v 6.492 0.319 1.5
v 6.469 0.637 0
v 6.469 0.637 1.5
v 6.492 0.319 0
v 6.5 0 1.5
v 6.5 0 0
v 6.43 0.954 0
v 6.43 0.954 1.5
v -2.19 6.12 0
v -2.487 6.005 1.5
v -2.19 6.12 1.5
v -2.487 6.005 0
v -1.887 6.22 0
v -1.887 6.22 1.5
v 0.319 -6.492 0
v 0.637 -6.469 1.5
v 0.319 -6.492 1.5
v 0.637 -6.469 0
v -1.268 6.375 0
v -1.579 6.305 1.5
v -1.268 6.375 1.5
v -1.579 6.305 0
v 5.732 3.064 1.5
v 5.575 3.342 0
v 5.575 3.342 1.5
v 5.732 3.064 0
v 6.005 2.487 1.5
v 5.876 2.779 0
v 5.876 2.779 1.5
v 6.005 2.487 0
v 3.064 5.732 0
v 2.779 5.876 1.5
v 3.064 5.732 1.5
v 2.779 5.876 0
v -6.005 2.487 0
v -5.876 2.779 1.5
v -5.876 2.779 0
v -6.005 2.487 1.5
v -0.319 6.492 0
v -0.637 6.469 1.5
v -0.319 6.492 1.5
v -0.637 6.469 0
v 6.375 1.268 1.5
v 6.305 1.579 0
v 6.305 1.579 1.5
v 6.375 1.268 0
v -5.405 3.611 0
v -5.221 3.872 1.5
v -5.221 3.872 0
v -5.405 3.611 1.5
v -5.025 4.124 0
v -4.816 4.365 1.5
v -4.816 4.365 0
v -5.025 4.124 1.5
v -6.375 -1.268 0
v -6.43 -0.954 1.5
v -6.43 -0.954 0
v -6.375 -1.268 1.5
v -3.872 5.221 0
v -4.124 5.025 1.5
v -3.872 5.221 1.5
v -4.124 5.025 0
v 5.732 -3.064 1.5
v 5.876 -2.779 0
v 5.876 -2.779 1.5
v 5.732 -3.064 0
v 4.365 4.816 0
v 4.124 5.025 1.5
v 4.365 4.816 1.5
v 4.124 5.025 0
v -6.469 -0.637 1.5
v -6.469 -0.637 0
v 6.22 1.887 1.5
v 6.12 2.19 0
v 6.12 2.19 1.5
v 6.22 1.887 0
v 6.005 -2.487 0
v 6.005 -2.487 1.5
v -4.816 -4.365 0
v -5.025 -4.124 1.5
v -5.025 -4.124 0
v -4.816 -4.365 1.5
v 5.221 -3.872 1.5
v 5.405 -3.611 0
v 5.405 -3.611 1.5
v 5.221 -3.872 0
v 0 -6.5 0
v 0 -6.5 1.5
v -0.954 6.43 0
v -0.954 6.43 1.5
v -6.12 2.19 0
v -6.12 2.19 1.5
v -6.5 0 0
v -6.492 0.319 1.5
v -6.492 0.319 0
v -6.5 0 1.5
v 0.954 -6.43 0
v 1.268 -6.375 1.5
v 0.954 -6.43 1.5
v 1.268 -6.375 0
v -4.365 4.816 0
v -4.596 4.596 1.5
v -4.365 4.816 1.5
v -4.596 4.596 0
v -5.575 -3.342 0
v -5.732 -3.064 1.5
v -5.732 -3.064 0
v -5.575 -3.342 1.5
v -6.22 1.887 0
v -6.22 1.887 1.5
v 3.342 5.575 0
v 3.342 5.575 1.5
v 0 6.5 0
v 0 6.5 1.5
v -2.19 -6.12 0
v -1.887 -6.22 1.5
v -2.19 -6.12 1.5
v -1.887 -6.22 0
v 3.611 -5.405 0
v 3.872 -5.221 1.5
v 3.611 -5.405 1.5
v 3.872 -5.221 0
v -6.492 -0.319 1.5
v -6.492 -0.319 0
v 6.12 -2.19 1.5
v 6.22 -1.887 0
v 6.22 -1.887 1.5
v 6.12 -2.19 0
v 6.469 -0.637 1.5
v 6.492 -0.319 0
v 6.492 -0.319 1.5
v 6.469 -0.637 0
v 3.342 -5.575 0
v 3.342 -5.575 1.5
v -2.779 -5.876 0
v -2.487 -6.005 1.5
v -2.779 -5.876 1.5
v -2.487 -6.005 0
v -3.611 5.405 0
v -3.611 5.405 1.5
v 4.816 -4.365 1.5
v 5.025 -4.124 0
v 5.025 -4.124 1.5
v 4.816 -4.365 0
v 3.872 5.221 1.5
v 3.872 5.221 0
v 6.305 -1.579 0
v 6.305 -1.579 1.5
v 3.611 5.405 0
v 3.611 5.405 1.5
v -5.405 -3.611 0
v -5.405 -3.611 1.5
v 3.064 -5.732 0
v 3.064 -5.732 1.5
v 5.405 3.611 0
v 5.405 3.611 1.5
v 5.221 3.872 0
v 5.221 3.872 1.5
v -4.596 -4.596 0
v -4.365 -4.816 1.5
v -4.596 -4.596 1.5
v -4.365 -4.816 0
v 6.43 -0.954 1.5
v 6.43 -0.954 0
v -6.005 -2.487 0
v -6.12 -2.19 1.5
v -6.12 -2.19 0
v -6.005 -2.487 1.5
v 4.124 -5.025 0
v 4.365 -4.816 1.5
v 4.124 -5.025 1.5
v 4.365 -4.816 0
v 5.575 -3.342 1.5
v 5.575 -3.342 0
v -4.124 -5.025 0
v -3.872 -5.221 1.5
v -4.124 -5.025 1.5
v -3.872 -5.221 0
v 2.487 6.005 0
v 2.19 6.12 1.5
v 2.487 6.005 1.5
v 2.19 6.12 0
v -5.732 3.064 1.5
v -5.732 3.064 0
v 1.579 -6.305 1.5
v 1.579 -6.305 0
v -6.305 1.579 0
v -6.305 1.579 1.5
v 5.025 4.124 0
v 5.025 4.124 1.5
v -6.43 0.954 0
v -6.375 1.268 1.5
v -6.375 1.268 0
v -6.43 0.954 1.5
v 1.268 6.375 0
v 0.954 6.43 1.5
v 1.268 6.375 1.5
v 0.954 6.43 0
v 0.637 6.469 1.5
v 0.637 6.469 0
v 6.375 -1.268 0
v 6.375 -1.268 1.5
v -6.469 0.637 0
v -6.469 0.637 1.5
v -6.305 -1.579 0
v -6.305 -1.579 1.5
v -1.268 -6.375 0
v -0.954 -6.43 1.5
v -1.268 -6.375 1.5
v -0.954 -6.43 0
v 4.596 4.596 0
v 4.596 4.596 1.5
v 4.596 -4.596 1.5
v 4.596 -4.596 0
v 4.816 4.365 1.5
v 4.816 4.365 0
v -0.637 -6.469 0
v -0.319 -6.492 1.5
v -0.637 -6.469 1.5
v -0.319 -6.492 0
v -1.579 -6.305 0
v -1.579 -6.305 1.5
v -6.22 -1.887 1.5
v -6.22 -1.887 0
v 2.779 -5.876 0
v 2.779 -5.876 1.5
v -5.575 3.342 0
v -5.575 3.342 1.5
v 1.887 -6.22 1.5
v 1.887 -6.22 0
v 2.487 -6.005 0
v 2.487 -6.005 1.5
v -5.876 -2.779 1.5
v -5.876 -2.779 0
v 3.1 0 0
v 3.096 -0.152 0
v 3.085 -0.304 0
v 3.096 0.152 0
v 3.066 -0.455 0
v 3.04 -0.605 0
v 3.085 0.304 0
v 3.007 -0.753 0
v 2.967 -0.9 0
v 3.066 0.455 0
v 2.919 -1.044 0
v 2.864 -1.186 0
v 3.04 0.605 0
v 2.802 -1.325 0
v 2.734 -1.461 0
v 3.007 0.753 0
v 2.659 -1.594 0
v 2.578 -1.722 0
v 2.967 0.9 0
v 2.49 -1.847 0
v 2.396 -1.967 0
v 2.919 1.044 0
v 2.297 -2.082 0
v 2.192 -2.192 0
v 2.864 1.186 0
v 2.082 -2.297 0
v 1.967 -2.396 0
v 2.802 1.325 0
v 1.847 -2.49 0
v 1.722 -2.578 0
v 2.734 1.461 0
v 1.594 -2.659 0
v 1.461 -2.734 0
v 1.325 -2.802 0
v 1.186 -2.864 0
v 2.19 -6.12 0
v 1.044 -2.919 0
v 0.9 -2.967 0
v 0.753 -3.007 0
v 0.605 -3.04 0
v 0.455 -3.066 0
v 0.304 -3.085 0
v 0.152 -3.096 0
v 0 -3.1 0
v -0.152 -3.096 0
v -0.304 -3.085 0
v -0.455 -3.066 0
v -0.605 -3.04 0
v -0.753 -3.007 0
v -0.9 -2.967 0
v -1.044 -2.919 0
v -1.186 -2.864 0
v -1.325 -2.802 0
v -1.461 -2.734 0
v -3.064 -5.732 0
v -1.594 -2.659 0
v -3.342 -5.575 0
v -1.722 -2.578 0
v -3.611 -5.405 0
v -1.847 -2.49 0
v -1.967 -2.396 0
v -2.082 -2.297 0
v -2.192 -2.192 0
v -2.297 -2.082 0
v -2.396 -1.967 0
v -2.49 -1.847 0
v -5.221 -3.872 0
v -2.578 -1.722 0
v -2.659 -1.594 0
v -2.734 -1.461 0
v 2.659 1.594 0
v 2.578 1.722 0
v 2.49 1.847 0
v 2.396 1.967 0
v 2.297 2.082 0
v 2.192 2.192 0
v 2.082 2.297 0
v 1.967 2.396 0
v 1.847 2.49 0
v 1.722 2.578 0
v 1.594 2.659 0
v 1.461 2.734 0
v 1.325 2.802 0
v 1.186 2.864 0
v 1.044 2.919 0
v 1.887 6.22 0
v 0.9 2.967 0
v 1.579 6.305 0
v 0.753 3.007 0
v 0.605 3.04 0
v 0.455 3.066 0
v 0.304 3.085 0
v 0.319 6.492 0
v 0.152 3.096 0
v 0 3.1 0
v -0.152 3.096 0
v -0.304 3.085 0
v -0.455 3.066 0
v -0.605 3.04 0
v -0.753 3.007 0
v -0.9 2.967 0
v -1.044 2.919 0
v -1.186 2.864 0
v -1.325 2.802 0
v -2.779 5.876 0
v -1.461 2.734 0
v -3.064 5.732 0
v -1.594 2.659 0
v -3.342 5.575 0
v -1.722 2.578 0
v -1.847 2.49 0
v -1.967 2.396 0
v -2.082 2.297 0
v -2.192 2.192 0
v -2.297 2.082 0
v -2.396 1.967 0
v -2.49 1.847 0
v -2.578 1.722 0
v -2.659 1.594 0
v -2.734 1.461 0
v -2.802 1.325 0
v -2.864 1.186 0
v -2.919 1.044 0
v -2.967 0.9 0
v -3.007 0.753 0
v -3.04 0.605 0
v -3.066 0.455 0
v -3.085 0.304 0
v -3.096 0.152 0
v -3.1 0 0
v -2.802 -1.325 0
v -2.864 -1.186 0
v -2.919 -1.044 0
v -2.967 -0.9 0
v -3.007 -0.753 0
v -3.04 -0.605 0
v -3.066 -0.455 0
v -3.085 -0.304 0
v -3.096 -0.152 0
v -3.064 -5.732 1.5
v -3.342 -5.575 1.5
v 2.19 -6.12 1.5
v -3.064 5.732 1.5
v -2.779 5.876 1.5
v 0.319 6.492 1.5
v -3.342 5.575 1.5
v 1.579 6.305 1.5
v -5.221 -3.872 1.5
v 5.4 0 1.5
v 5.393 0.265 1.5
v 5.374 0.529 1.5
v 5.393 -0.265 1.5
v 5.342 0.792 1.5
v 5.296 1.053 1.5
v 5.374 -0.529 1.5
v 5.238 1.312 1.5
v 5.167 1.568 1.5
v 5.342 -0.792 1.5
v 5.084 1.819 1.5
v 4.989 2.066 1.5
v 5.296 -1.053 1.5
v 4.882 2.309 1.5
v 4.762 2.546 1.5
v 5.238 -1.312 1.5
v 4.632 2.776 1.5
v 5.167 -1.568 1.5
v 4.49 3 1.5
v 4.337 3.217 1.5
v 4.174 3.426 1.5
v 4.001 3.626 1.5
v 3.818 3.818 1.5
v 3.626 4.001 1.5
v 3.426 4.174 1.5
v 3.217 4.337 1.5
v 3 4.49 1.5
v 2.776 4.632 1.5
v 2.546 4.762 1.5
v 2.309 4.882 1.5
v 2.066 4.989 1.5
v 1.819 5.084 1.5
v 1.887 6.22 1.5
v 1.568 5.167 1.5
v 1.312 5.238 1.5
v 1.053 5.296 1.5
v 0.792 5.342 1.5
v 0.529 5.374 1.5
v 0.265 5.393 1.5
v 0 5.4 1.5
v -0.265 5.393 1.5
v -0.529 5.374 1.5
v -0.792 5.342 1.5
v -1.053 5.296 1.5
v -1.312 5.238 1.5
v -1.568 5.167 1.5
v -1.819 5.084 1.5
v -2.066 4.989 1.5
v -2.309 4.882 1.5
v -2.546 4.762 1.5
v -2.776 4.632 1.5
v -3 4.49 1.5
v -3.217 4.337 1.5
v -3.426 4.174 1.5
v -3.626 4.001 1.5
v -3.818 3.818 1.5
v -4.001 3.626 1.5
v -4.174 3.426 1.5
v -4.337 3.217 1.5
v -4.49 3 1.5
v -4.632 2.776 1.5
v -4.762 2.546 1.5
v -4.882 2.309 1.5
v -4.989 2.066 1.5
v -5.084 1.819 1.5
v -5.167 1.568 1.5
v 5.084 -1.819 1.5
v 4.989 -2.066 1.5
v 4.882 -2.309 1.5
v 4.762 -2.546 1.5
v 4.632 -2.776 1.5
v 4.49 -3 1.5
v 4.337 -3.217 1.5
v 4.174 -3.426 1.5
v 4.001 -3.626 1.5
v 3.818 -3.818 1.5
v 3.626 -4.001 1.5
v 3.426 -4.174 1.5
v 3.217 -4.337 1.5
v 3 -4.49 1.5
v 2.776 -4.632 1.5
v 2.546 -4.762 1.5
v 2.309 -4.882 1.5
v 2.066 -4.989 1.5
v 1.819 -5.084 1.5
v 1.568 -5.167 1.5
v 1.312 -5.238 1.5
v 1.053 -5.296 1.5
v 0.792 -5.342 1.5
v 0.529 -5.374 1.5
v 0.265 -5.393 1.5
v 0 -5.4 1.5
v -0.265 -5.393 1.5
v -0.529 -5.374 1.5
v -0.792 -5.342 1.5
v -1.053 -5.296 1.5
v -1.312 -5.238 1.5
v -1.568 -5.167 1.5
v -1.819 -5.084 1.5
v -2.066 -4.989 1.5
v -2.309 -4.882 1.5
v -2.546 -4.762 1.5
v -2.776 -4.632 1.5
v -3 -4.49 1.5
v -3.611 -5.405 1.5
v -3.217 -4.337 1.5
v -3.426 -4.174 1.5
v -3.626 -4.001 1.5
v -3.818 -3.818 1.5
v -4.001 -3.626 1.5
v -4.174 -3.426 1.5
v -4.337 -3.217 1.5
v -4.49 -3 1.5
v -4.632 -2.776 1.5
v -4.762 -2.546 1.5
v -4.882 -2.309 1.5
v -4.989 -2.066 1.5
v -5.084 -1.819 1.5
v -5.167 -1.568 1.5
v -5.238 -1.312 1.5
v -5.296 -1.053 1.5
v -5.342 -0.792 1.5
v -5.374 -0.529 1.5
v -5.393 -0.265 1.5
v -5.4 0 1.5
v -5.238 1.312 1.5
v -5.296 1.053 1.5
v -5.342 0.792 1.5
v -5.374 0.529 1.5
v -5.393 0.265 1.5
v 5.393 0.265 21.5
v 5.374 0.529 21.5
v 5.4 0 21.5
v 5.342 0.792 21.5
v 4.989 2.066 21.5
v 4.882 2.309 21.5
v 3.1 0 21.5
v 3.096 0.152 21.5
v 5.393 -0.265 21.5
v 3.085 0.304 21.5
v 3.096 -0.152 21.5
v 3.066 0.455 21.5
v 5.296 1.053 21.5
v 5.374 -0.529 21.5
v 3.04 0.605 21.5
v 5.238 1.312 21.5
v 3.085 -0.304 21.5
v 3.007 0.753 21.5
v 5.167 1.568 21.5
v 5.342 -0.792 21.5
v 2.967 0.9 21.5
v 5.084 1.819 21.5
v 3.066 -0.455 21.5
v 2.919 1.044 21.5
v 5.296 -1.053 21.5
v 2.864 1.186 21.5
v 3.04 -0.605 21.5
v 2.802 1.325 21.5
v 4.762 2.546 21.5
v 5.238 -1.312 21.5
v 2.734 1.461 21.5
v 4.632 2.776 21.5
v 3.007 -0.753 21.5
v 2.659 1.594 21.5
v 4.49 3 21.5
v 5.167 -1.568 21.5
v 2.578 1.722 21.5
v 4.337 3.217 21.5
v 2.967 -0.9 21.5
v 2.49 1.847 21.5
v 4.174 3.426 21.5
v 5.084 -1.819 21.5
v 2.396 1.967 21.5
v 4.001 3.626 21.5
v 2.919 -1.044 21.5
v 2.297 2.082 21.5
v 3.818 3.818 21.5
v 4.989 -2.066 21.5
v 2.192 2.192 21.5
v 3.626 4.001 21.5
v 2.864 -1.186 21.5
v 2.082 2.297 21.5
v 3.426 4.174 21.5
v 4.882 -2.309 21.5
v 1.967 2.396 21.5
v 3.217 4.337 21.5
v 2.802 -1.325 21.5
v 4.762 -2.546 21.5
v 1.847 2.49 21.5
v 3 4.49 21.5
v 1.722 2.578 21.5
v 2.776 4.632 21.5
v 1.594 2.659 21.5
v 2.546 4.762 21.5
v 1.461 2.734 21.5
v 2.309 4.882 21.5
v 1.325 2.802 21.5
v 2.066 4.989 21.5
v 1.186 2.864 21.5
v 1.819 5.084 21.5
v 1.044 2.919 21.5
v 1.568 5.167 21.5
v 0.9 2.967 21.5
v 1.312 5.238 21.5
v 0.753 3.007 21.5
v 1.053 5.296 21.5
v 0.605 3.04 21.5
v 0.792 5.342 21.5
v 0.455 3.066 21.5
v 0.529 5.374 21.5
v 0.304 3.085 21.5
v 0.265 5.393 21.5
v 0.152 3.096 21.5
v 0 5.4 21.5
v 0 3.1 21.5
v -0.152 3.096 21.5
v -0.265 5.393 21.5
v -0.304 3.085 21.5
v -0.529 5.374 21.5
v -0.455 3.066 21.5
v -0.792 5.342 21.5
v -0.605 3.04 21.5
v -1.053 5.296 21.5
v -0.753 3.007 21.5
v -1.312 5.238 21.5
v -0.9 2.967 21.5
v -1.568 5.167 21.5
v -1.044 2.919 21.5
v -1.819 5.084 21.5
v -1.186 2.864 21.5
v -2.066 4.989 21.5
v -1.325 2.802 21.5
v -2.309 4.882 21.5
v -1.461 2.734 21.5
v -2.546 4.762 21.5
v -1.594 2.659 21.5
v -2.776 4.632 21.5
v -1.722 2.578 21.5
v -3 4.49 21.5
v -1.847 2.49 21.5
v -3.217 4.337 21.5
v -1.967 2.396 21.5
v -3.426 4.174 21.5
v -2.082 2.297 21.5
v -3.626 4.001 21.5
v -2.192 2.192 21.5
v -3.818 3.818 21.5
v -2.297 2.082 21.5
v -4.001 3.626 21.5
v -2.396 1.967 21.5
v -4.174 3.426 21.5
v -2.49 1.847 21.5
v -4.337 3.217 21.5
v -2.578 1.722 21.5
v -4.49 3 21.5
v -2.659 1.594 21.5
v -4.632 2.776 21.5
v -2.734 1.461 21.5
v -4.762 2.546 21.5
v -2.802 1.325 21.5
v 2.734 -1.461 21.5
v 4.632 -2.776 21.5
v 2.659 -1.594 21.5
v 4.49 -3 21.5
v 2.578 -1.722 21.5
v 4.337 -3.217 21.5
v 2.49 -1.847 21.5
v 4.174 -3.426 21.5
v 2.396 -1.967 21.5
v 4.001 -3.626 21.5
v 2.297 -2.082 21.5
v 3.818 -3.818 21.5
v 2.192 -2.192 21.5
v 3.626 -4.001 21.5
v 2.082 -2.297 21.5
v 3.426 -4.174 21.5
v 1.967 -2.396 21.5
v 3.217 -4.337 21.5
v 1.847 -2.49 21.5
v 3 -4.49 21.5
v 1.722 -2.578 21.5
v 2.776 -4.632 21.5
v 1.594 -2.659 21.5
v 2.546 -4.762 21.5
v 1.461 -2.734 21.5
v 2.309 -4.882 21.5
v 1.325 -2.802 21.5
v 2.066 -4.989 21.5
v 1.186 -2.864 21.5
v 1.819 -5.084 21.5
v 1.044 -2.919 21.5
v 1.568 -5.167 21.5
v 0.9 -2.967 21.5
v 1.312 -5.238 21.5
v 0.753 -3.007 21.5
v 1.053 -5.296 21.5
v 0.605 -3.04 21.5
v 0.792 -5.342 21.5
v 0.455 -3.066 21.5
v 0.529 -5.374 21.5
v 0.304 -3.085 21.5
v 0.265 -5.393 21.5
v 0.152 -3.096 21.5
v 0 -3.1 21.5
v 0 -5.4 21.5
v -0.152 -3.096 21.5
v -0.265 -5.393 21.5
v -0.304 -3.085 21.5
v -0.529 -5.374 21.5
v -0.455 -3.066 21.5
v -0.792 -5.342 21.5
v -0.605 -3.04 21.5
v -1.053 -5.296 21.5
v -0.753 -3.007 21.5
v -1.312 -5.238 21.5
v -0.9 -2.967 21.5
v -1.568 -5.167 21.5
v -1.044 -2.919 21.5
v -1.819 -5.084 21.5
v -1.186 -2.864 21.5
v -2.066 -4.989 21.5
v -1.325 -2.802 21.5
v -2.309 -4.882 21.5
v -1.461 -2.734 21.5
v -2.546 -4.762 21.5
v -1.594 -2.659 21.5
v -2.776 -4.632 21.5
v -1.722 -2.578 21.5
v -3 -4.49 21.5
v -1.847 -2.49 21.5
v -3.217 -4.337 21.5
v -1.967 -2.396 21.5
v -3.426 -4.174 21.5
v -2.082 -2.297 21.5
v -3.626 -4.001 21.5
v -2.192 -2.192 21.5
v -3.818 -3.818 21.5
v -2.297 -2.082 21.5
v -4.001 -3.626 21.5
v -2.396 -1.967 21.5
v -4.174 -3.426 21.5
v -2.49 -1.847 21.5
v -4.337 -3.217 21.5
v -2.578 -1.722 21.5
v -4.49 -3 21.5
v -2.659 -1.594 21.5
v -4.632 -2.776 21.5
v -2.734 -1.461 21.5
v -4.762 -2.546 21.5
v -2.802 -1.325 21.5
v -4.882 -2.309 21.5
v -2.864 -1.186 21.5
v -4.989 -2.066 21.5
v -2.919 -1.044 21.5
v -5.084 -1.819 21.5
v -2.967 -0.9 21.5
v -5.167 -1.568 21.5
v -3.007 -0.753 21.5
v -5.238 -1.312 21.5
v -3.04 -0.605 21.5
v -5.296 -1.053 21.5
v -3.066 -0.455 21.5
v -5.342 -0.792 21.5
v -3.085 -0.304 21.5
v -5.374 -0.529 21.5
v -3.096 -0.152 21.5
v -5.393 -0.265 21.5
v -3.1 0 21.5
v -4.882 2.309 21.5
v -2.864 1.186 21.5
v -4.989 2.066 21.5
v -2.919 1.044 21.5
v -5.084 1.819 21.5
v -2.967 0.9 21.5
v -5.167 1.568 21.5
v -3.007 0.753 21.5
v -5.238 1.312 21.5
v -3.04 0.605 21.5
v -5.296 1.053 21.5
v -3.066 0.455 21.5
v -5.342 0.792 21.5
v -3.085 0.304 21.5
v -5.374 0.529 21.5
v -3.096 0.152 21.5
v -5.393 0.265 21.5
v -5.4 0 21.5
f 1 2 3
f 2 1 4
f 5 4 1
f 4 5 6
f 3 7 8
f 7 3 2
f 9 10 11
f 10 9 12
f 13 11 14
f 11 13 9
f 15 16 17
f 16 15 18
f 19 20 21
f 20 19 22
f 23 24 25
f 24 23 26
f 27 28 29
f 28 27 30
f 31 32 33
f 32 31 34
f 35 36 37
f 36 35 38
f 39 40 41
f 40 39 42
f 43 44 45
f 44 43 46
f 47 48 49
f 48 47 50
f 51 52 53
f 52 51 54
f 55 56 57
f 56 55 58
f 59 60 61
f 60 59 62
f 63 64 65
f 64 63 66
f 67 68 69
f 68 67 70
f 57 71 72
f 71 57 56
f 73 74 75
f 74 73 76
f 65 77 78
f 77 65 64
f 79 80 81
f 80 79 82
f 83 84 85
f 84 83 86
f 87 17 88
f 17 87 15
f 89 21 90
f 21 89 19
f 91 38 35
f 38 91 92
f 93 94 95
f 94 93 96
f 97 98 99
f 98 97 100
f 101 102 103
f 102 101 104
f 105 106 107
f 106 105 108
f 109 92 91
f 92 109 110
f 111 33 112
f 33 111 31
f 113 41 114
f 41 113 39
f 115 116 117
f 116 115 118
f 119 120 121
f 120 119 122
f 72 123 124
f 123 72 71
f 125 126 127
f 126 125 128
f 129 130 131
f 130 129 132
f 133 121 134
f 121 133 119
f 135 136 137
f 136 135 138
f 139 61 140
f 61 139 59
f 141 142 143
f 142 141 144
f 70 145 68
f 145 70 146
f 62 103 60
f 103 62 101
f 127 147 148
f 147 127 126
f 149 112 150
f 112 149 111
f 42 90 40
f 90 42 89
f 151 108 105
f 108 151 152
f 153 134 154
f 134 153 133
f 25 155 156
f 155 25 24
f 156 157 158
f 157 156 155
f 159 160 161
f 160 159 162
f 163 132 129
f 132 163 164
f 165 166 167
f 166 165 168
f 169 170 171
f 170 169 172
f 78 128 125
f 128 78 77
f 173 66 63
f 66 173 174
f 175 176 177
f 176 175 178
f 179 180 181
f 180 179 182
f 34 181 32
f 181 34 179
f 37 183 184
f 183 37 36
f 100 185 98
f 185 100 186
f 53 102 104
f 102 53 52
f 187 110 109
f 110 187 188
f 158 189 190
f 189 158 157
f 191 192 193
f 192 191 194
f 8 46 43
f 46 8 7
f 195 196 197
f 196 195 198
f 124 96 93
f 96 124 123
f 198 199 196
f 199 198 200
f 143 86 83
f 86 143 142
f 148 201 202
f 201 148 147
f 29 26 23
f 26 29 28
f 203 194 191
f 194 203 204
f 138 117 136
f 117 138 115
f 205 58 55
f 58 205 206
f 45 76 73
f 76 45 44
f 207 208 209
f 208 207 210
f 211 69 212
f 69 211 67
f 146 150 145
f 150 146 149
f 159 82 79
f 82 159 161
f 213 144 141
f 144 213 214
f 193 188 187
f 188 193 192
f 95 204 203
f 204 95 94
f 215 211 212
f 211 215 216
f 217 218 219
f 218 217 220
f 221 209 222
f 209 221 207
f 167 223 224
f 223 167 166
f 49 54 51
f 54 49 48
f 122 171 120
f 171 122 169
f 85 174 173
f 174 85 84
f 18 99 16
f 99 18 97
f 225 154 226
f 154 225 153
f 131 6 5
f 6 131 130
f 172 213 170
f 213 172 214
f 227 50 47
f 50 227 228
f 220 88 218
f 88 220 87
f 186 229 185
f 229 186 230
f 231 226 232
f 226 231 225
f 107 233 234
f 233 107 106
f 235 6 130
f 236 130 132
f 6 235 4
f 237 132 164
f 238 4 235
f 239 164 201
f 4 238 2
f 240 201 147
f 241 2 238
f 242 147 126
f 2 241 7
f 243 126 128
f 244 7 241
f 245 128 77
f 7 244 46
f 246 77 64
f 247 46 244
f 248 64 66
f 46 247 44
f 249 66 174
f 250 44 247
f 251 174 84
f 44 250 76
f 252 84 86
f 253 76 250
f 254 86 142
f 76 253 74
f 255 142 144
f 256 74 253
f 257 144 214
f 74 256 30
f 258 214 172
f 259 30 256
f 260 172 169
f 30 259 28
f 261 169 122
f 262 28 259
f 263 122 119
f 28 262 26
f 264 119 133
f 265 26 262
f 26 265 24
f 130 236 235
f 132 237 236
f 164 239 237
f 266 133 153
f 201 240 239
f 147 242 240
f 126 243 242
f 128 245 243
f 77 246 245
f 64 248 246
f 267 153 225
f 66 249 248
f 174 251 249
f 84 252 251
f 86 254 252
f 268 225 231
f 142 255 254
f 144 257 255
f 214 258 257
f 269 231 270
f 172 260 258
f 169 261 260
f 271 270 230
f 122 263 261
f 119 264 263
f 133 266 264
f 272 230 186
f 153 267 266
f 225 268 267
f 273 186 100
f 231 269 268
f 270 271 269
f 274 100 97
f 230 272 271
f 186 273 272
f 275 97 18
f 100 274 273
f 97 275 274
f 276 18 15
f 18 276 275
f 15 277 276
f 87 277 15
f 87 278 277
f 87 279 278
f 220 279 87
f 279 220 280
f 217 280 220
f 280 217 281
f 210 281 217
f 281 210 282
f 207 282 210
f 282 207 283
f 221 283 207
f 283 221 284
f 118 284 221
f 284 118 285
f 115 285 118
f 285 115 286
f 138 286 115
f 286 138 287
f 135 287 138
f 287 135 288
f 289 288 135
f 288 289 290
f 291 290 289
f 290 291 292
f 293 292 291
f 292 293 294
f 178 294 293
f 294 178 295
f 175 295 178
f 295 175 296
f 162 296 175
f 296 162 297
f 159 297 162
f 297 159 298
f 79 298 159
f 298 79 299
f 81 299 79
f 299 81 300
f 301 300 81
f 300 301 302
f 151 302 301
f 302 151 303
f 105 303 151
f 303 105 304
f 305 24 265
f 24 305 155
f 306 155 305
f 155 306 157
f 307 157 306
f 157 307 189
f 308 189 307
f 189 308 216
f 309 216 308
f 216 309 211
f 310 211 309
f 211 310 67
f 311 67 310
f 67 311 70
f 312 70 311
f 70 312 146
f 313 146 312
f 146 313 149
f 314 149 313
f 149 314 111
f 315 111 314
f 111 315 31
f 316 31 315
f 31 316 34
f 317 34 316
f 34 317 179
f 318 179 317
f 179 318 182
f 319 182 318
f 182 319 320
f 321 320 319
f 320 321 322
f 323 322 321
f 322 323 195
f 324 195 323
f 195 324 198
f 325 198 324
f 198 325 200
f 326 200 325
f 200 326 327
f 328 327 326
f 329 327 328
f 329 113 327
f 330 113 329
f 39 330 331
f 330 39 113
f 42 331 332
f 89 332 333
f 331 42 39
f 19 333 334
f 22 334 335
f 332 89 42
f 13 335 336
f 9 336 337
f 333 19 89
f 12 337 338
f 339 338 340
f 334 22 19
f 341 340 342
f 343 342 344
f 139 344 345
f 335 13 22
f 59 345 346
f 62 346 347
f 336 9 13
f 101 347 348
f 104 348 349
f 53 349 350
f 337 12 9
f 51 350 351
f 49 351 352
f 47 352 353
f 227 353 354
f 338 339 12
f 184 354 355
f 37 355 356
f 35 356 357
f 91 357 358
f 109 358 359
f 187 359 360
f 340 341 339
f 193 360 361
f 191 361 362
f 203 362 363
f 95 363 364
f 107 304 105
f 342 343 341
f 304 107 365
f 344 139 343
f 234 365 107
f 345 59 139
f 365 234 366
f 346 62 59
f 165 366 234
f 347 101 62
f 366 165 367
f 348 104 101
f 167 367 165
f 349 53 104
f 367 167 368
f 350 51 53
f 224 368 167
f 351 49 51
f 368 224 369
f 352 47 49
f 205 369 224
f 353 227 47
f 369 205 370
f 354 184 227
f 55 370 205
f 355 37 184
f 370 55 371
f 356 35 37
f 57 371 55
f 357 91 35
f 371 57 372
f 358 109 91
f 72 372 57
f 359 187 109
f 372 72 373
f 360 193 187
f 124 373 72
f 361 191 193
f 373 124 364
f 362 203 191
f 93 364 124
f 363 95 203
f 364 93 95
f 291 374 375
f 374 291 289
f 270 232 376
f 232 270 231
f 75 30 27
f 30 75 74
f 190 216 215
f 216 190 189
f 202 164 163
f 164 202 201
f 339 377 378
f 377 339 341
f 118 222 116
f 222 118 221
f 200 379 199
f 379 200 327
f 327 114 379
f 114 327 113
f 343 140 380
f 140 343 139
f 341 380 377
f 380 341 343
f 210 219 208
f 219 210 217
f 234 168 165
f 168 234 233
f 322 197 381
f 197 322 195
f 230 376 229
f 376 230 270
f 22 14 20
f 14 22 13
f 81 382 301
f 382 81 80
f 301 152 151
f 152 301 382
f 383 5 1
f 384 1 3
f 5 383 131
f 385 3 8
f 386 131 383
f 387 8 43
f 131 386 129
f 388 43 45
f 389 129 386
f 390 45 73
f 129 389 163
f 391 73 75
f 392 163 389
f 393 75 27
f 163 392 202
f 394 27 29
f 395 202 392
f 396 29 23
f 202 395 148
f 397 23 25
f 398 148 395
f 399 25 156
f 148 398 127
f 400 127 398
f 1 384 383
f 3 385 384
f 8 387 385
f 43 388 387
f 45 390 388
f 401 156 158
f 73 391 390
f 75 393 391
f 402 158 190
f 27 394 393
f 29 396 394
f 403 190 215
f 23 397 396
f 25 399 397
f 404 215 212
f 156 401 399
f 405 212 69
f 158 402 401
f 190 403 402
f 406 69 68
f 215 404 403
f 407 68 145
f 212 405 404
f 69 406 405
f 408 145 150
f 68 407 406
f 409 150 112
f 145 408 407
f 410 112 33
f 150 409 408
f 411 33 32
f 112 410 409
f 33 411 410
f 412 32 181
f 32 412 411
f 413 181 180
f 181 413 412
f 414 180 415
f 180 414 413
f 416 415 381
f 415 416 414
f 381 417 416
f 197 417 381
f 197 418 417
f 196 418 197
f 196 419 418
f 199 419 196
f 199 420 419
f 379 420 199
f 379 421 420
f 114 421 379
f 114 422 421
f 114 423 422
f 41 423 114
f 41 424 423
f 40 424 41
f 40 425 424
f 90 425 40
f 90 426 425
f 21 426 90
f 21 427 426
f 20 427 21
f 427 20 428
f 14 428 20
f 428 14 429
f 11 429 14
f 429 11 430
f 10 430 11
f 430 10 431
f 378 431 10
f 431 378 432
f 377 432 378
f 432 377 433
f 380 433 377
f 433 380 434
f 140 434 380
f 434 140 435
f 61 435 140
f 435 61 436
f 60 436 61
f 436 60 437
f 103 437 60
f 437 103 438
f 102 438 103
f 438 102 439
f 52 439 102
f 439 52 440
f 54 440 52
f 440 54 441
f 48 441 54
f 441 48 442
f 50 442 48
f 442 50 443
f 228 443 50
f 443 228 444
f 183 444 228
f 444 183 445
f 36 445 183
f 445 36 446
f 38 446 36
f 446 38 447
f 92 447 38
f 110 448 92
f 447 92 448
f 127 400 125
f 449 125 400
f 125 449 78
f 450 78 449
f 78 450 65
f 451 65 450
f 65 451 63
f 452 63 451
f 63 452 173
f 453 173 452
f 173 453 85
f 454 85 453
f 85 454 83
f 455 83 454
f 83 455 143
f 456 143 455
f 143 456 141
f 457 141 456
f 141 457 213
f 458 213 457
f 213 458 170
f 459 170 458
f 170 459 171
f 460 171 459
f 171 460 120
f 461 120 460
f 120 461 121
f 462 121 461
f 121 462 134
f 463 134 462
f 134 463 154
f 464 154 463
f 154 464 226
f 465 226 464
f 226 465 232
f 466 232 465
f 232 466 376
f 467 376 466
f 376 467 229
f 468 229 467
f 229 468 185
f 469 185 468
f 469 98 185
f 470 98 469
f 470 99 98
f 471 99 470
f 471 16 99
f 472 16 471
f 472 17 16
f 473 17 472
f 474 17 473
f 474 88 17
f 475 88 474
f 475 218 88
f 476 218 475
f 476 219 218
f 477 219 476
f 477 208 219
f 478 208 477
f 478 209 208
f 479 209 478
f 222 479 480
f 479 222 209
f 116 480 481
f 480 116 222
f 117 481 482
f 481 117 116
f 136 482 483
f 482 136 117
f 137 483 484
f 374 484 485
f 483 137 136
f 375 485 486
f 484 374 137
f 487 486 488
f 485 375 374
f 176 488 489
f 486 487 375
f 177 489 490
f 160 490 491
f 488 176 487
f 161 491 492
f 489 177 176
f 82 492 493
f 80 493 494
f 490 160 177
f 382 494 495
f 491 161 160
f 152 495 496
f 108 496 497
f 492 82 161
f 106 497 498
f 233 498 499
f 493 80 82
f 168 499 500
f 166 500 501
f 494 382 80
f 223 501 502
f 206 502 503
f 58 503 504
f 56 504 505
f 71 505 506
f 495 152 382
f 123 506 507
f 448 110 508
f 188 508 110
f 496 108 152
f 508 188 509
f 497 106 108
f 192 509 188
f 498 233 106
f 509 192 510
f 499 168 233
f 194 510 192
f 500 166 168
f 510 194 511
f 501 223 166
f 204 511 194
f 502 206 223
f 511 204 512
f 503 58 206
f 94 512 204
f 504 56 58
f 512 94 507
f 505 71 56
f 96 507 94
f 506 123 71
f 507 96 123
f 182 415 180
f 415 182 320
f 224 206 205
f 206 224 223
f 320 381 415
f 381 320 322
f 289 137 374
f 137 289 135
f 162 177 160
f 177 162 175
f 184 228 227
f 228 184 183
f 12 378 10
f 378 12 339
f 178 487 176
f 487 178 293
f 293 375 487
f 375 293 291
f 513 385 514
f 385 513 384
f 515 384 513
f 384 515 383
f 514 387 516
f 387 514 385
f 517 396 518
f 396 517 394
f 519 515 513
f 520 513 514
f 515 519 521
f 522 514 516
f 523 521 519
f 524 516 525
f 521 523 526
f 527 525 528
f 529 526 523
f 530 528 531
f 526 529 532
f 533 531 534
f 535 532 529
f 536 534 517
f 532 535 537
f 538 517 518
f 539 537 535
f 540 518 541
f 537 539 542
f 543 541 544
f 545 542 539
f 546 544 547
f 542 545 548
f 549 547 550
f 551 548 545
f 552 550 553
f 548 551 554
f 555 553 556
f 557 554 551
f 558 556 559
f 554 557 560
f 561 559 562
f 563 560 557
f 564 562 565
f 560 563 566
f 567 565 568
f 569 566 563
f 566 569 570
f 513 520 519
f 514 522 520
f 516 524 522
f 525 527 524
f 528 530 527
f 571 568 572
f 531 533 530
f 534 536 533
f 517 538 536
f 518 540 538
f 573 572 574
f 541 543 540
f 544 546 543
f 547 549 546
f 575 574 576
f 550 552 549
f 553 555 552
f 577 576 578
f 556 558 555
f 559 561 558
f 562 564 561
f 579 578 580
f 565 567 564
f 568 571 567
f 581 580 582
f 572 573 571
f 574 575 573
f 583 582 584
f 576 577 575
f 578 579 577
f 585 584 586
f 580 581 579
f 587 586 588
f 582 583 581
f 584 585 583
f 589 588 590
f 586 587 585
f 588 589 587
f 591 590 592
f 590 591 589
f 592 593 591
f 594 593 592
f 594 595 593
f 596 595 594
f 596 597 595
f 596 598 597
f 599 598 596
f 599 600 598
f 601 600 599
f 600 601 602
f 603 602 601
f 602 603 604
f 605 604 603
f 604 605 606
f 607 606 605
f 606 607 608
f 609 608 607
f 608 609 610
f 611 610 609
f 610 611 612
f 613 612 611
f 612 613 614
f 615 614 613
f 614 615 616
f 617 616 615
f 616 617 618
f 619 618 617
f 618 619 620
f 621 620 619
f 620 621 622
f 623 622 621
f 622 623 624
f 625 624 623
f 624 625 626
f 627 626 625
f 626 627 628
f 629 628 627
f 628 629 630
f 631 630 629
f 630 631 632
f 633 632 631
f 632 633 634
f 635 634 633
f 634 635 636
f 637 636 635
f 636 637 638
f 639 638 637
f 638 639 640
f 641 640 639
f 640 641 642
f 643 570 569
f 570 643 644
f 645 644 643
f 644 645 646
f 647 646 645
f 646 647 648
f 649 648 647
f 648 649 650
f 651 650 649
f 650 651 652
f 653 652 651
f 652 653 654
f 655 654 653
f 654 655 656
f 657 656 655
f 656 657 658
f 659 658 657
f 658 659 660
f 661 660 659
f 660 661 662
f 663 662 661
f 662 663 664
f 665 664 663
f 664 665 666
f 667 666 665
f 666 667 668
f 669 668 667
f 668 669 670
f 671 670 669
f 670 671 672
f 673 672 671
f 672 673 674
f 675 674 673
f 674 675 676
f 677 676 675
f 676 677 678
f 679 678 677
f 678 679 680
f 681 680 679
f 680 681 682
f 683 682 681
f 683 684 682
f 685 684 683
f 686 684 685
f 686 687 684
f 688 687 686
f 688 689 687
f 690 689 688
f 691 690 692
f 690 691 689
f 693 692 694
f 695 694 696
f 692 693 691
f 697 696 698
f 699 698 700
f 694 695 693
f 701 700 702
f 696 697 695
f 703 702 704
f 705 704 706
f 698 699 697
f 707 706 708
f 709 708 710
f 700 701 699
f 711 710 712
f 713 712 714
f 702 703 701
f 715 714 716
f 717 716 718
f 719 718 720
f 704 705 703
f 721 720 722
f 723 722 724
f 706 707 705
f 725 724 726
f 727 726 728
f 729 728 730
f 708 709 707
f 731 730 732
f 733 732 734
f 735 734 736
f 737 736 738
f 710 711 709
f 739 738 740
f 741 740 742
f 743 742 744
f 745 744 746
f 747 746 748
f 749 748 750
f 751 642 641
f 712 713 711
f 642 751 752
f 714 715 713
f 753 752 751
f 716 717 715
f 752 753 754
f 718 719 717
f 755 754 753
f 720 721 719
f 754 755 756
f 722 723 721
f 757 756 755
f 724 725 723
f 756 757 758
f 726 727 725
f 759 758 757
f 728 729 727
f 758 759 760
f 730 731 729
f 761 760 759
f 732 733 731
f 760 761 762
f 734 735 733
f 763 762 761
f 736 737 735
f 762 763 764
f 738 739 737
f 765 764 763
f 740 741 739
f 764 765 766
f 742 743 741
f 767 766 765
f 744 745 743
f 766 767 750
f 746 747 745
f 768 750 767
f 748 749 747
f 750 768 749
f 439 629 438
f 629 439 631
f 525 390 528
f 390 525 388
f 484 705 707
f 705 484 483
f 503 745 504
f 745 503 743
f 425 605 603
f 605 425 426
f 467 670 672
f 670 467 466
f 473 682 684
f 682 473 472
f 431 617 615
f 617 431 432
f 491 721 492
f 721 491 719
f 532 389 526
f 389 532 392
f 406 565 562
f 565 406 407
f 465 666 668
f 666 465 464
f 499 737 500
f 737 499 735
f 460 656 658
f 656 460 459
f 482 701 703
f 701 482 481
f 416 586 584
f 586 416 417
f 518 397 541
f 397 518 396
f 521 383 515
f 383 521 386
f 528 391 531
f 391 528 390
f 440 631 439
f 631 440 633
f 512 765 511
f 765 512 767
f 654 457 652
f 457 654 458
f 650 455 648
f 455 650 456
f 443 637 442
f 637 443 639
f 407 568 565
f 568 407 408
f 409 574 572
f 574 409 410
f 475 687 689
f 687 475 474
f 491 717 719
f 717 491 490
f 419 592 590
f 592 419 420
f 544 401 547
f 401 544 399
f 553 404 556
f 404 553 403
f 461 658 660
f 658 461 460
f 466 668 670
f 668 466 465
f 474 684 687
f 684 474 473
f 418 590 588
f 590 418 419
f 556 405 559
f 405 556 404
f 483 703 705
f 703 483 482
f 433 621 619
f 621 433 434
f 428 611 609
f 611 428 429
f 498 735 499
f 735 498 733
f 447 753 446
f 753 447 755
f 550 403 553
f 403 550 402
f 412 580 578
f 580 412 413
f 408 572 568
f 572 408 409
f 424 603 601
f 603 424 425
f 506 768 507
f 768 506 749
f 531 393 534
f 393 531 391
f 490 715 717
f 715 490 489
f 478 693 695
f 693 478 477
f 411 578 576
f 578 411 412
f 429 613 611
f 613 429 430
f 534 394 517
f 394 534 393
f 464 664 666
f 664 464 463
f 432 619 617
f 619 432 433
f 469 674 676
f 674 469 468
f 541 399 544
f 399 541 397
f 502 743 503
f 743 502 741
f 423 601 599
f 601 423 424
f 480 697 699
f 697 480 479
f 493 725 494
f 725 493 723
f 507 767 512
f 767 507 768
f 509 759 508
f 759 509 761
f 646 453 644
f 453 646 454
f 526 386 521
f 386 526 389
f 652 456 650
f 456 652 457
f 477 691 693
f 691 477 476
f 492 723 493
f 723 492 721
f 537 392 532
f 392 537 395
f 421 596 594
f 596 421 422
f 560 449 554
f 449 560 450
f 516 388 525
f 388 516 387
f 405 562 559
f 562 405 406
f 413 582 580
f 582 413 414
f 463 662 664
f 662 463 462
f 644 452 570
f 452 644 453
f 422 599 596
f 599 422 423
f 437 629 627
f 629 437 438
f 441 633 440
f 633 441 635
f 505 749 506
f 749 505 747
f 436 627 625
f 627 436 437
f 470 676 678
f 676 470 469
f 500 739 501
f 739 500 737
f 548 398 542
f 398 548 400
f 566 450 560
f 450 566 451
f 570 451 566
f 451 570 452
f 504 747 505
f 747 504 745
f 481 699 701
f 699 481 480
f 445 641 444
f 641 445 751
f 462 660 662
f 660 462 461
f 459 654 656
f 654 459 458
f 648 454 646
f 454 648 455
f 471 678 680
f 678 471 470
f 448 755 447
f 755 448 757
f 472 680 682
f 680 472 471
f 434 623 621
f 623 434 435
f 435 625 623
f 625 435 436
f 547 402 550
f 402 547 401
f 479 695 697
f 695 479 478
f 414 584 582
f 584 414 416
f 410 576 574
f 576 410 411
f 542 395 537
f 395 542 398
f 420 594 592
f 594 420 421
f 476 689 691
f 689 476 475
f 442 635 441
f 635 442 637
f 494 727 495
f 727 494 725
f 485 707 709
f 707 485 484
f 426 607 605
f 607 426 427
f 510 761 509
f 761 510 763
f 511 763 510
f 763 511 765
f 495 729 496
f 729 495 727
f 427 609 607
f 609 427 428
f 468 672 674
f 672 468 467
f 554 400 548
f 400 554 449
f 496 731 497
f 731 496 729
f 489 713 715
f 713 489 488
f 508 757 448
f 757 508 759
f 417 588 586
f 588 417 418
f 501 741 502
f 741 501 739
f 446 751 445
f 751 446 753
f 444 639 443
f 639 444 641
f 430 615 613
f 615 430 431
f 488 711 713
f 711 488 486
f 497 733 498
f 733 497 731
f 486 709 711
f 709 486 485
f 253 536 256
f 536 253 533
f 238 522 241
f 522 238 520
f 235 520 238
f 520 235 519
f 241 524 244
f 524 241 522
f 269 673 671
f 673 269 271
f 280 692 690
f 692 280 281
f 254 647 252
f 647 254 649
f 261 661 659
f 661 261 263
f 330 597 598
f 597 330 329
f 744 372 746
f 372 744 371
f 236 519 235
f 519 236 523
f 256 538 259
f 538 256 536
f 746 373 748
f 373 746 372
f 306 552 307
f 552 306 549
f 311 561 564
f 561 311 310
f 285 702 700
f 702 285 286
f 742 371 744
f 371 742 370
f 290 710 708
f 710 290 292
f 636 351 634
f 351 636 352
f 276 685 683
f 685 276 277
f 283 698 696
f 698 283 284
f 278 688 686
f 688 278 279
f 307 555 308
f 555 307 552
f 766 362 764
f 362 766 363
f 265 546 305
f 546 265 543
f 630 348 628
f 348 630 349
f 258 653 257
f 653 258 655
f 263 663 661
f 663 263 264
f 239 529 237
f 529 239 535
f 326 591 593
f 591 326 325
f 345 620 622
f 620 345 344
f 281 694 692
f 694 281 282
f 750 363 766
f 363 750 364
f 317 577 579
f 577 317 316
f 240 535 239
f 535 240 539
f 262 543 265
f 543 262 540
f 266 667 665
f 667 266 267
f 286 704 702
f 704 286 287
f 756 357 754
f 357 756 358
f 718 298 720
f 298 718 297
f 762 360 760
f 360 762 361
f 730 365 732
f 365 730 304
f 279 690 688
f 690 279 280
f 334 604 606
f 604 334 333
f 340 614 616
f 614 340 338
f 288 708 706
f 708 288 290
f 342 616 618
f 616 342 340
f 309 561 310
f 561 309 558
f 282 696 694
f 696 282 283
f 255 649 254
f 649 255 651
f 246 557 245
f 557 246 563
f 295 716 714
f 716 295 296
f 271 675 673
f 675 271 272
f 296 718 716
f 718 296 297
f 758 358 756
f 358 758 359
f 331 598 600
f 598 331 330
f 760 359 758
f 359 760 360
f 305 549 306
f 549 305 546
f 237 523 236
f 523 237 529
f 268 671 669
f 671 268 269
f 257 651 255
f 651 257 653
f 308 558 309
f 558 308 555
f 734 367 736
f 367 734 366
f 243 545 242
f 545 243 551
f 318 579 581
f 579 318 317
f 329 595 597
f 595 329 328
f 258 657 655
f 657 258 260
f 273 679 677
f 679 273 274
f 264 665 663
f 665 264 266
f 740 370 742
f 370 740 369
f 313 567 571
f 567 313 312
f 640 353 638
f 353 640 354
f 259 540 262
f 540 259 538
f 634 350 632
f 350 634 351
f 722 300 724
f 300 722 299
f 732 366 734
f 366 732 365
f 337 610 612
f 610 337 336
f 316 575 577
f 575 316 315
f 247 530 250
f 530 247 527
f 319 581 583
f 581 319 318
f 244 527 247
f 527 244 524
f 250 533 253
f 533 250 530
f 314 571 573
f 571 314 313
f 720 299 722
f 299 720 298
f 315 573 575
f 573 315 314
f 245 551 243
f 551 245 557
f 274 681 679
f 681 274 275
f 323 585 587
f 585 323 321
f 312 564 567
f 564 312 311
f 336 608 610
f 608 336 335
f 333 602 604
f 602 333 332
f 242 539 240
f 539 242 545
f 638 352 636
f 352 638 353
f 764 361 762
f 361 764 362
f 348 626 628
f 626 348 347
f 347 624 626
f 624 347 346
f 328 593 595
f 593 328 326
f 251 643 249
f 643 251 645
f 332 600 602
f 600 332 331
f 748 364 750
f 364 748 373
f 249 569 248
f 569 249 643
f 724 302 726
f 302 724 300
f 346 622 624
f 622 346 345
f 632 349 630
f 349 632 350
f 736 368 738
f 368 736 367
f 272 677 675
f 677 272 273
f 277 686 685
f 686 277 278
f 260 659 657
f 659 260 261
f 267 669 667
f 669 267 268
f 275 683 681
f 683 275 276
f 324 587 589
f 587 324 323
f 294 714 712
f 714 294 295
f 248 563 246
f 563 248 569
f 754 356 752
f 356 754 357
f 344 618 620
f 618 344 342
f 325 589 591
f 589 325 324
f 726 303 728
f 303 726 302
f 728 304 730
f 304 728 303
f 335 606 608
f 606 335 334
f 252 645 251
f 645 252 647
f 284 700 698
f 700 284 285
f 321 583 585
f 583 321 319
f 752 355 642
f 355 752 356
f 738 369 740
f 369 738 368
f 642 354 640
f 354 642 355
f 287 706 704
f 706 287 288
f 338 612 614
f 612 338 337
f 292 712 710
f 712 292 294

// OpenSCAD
// Adapter sleeve for 0.2 mL PCR tube in 1.5 mL rack
// Print orientation: Upside down (Collar on bed)
// Units: mm

// --- Dimensions ---
$fn = 128; // High resolution for smooth curves

// Collar dimensions (Bottom, on bed)
$collar_diameter = 13;
$collar_thickness = 1.5;

// Sleeve body dimensions (Rising from collar)
$sleeve_outer_diameter = 10.8;
$sleeve_total_height = 21.5; // Total height of the sleeve body section

// Bore dimensions
$bore_diameter = 6.2;

// --- Calculations ---
// Total height of the part (Collar + Sleeve Body)
$part_total_height = $collar_thickness + $sleeve_total_height;

// Outer radius of the collar
$r_collar = $collar_diameter / 2;

// Outer radius of the sleeve body
$r_sleeve = $sleeve_outer_diameter / 2;

// Bore radius
$r_bore = $bore_diameter / 2;

// --- Geometry Construction ---

difference() {
    // 1. The Main Body (Collar + Sleeve)
    union() {
        // Collar (at Z = 0)
        cylinder(
            h = $collar_thickness,
            r = $r_collar,
            center = [0, 0, $collar_thickness / 2],
            $fn = $fn
        );
        
        // Sleeve Body (starts at Z = $collar_thickness)
        // Height is exactly $sleeve_total_height as per spec
        cylinder(
            h = $sleeve_total_height,
            r = $r_sleeve,
            center = [0, 0, $collar_thickness + $sleeve_total_height / 2],
            $fn = $fn
        );
    }
    
    // 2. The Bore (Hole through the center)
    // Extends slightly past the top and bottom faces to ensure clean cut
    cylinder(
        h = $part_total_height + 0.1,
        r = $r_bore,
        center = [0, 0, $part_total_height / 2],
        $fn = $fn
    );
}
